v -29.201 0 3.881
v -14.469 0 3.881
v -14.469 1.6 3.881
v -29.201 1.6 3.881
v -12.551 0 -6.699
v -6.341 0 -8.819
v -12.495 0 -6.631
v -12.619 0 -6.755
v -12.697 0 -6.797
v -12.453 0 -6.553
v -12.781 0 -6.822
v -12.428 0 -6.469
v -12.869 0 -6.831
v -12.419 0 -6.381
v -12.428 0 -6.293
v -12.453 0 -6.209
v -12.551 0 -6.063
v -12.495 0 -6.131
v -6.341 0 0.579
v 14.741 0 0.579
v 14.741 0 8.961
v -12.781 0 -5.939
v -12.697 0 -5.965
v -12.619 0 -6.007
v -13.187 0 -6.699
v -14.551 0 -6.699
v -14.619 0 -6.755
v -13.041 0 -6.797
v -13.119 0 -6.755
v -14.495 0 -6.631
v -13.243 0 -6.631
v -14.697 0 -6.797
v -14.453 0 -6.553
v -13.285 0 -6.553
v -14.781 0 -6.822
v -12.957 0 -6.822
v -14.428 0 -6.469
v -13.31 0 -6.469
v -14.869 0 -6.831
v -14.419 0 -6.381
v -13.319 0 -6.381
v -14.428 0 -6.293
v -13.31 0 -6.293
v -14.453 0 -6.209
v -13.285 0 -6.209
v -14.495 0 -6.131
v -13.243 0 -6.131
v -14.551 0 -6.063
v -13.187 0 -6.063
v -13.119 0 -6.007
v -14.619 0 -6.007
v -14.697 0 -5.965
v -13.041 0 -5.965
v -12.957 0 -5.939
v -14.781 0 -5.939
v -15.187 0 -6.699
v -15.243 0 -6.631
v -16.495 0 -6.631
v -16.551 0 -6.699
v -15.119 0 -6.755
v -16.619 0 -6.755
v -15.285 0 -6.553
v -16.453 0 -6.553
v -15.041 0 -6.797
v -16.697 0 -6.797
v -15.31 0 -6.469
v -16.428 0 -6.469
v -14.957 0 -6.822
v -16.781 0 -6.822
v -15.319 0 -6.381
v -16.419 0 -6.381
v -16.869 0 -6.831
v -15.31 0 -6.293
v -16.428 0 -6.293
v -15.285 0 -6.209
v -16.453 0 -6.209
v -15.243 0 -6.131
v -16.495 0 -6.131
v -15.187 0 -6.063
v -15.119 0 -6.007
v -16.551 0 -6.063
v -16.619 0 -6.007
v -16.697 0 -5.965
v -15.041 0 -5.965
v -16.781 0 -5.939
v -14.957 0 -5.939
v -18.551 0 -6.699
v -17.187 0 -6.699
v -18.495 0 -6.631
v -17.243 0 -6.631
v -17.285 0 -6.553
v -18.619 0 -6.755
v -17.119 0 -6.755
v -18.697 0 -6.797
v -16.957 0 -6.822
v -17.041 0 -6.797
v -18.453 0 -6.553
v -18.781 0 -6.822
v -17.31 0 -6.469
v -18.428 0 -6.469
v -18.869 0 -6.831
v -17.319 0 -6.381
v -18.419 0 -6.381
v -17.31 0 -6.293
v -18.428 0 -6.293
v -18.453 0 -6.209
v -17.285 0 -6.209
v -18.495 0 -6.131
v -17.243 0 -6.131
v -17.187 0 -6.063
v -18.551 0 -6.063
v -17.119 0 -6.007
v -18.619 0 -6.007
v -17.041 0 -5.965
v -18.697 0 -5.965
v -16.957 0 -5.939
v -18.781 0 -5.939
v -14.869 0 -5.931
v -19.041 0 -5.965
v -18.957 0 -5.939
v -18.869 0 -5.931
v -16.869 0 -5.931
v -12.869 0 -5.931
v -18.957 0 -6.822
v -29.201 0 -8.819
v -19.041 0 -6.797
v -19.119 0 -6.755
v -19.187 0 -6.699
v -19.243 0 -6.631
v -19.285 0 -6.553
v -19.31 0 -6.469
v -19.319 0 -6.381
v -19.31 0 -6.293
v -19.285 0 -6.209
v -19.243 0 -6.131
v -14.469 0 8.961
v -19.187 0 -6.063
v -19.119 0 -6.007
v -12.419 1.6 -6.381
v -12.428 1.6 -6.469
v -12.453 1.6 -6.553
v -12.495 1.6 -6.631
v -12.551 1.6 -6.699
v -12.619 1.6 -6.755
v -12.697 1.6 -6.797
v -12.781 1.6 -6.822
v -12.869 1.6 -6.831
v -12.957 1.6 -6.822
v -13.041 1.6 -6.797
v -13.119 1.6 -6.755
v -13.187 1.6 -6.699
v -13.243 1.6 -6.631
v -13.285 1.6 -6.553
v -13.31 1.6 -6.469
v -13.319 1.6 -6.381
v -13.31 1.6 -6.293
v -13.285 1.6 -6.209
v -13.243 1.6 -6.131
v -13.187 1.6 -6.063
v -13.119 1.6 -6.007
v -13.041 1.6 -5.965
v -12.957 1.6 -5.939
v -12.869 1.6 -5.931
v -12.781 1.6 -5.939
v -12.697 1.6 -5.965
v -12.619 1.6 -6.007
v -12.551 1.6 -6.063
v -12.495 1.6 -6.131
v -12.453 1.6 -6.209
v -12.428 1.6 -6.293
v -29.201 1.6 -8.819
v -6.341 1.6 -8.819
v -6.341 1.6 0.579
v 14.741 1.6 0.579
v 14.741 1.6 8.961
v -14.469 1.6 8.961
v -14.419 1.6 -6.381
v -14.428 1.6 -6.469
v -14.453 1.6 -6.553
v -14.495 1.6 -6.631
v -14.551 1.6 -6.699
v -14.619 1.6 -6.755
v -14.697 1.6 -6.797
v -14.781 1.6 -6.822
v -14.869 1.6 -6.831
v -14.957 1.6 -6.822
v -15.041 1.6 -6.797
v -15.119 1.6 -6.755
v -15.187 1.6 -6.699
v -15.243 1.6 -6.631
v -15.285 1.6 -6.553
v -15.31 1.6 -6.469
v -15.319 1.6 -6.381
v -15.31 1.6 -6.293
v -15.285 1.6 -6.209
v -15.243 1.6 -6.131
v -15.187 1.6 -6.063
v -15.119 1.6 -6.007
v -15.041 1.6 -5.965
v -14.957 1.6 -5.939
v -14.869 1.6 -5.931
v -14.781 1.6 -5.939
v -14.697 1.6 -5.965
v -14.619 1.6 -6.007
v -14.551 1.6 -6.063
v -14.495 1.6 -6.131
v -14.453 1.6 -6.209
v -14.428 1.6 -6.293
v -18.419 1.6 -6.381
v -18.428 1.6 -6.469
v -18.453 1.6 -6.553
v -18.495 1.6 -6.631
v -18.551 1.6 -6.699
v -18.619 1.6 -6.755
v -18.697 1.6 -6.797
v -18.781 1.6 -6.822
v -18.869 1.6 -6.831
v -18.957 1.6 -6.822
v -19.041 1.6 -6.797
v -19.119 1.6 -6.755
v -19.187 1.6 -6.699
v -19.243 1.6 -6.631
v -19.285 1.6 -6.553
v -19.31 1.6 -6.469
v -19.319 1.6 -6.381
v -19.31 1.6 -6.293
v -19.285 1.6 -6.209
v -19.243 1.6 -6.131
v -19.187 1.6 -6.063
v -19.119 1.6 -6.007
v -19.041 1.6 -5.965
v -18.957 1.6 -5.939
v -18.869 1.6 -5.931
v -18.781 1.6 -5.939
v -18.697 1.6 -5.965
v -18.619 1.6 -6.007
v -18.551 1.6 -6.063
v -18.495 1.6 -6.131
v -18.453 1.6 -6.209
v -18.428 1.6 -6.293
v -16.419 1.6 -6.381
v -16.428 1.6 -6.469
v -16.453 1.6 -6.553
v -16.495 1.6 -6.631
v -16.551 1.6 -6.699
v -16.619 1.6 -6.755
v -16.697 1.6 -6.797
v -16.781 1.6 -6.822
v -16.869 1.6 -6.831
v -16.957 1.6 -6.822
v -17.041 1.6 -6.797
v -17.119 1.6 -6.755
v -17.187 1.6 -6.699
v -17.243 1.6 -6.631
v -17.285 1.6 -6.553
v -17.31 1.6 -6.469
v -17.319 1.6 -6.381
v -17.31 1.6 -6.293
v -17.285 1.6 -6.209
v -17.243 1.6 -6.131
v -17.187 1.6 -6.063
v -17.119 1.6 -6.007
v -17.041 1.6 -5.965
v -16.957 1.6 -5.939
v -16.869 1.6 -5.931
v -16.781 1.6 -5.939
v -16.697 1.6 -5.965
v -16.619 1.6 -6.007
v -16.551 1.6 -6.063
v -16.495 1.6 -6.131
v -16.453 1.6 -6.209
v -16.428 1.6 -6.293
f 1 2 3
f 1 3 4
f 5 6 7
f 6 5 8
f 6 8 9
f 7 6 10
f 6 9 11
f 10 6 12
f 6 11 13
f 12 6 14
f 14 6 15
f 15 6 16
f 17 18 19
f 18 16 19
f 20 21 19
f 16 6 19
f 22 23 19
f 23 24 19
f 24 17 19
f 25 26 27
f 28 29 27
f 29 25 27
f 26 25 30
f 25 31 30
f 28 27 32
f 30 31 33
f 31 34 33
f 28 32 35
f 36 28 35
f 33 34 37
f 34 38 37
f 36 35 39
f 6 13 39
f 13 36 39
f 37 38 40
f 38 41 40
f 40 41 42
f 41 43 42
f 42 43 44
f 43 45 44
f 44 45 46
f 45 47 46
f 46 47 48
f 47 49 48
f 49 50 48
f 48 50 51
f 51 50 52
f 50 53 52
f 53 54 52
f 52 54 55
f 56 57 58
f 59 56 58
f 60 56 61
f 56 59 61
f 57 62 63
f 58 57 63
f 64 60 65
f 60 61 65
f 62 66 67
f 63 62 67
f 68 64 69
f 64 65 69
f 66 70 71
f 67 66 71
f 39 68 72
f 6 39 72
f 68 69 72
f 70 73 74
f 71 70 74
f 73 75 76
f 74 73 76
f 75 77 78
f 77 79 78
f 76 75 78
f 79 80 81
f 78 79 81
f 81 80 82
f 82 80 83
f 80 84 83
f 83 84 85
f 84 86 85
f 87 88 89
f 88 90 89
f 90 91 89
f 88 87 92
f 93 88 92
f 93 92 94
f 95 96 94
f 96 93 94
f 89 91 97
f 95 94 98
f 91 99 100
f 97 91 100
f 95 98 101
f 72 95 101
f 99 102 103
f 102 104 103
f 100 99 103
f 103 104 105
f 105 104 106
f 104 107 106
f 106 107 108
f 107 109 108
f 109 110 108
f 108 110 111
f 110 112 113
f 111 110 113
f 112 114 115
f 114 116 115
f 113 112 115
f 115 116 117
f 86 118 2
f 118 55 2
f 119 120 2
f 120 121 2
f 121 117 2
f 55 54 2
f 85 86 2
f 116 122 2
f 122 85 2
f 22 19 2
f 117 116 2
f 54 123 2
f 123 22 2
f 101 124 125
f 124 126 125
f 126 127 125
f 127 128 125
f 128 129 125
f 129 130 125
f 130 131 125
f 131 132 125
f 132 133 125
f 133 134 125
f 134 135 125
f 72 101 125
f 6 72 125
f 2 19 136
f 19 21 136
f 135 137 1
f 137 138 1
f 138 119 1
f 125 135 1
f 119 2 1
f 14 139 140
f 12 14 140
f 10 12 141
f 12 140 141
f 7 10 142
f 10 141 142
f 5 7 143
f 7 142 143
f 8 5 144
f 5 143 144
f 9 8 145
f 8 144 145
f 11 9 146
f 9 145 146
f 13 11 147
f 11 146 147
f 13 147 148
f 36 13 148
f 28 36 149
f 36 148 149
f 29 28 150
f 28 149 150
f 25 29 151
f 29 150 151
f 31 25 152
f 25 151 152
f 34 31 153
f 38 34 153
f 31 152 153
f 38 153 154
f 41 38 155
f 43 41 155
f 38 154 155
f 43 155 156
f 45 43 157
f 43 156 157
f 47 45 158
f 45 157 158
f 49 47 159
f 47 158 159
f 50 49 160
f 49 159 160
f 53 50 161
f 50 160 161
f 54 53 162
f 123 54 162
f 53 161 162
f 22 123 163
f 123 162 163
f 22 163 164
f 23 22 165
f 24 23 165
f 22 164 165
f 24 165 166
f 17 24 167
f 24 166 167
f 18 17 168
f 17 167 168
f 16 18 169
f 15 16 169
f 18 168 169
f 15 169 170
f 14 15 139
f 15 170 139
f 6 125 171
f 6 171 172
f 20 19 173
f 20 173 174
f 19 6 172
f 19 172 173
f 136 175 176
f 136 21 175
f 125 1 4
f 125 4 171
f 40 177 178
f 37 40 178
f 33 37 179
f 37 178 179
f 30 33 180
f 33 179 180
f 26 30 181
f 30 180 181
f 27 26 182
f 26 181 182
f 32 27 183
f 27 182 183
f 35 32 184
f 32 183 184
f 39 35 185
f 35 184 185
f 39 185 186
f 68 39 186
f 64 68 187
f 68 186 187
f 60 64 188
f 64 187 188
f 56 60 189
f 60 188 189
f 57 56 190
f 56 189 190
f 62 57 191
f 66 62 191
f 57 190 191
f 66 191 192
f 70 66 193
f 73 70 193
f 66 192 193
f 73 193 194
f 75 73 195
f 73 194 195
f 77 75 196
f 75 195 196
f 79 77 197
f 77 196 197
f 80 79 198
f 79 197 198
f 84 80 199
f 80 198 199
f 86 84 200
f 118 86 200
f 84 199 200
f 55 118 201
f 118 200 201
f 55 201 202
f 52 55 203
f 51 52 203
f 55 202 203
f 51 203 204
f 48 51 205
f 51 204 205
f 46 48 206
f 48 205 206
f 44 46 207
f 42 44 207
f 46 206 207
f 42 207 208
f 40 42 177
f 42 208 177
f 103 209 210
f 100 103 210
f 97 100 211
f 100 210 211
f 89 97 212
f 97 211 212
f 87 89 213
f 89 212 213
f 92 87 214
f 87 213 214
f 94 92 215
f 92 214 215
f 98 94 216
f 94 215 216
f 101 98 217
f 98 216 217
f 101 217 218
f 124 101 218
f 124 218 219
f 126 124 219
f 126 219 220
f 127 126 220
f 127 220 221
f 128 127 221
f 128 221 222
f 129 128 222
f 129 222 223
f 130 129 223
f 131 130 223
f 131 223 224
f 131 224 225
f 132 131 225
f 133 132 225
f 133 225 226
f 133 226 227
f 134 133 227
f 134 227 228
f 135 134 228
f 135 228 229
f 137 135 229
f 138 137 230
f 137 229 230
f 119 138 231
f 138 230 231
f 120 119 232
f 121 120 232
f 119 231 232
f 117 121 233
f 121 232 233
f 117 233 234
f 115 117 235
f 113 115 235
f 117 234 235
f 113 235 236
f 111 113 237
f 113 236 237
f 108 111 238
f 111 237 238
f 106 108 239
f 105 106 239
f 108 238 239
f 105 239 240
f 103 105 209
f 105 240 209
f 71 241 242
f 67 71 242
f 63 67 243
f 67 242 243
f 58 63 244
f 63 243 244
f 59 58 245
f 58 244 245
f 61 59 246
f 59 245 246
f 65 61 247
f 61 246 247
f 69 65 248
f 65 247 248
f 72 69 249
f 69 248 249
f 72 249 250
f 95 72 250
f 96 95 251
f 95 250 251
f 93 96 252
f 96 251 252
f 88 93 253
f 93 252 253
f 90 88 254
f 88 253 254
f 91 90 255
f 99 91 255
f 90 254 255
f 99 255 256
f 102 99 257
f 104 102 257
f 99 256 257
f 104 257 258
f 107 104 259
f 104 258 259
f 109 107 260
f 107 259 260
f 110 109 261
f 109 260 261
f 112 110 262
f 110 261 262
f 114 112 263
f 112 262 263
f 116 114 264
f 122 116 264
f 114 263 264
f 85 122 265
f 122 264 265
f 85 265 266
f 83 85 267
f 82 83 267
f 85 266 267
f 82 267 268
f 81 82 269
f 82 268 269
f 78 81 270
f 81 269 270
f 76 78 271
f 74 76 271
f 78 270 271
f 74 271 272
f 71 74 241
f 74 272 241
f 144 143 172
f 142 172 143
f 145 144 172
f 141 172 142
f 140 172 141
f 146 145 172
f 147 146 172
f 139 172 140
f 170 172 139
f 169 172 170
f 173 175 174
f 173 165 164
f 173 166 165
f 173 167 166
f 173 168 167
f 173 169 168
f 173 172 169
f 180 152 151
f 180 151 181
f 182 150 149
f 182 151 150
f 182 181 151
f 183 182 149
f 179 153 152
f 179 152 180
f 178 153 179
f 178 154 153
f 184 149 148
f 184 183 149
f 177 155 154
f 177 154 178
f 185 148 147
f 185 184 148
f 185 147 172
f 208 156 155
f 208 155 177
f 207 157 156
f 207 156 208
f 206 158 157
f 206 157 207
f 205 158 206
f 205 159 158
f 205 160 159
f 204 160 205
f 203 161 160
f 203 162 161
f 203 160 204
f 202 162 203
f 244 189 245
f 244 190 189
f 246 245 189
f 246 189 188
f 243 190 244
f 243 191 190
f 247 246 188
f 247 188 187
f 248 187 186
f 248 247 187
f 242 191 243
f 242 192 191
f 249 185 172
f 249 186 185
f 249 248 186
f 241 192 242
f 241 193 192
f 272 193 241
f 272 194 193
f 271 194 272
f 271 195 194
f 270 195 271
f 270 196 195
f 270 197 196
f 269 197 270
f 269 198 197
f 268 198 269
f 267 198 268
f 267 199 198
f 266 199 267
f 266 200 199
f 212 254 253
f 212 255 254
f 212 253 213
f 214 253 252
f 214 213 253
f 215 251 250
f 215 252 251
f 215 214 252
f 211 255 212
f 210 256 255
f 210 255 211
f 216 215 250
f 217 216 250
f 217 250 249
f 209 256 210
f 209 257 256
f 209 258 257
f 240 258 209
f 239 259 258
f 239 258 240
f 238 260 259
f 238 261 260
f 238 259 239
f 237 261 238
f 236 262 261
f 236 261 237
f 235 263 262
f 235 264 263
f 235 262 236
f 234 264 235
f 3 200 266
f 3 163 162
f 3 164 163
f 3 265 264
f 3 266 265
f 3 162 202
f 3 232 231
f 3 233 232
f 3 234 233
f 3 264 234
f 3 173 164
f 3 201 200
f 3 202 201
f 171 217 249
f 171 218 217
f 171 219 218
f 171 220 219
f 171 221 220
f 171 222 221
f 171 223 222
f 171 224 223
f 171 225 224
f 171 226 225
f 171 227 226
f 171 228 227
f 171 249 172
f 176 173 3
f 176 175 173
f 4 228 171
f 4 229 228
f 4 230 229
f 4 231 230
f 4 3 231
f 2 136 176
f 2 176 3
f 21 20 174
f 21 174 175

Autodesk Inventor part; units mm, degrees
ref_plane "YZ Plane" through (0, 0, 0) normal (1, 0, 0) x (0, 1, 0)
ref_plane "XZ Plane" through (0, 0, 0) normal (0, 1, 0) x (-1, 0, 0)
ref_plane "XY Plane" through (0, 0, 0) normal (0, 0, 1) x (1, 0, 0)
sketch "Sketch1" plane through (0, 0, 0) normal (0, 1, 0) x (-1, 0, 0)
  line L0 (-14.7409, 8.9608) -> (29.2011, 8.9608)
  line L1 (29.2011, 8.9608) -> (29.2011, -8.8192)
  line L2 (29.2011, -8.8192) -> (-14.7409, -8.8192)
  line L3 (-14.7409, -8.8192) -> (-14.7409, 8.9608)
  line L4 (-14.7409, 8.9608) -> (14.4691, 8.9608)
  line L5 (14.4691, 8.9608) -> (14.4691, 3.8808)
  line L6 (6.3411, 0.5788) -> (-14.7409, 0.5788)
  line L7 (-14.7409, 0.5788) -> (-14.7409, 8.9608)
  line L8 (29.2011, -8.8192) -> (6.3411, -8.8192)
  line L9 (6.3411, -8.8192) -> (6.3411, 0.5788)
  line L10 (14.4691, 3.8808) -> (29.2011, 3.8808)
  line L11 (29.2011, 3.8808) -> (29.2011, -8.8192)
  point P0 (0, 0)
  dimension "d0" = 43.942
  dimension "d1" = 17.78
  dimension "d2" = 21.082
  dimension "d3" = 14.732
  dimension "d4" = 9.398
  dimension "d5" = 5.08
extrude "Extrusion1" add sketch "Sketch1" along normal blind 1.6 contours L0 L5 L10 L1 L2 L9 L6 L3
sketch "Sketch2" plane through (0, 1.6, 0) normal (0, 1, 0) x (1, 0, 0)
  line L0 (-6.3411, -0.5788) -> (-6.3411, 8.8192) projected
  line L1 (-6.3411, 8.8192) -> (-29.2011, 8.8192) projected
  line L2 (-14.4691, -8.9608) -> (14.7409, -8.9608) projected
  circle A0 centre (-12.8689, 6.3808) radius 0.45
  line L3 (-18.8689, 6.3808) -> (-12.8689, 6.3808) construction
  circle A1 centre (-14.8689, 6.3808) radius 0.45
  circle A2 centre (-16.8689, 6.3808) radius 0.45
  circle A3 centre (-18.8689, 6.3808) radius 0.45
  point P0 (0, 0)
  dimension "d9" = 6.5278
  dimension "d15" = 0.9
  dimension "d16" = 2.4384
  dimension "d19" = 0.9
  dimension "d20" = 0.9
  dimension "d21" = 0.9
  dimension "d22" = 2
  dimension "d23" = 2
  dimension "d24" = 2
extrude "Extrusion2" cut sketch "Sketch2" against normal up to next
properties part number "MezzanineBoard"
